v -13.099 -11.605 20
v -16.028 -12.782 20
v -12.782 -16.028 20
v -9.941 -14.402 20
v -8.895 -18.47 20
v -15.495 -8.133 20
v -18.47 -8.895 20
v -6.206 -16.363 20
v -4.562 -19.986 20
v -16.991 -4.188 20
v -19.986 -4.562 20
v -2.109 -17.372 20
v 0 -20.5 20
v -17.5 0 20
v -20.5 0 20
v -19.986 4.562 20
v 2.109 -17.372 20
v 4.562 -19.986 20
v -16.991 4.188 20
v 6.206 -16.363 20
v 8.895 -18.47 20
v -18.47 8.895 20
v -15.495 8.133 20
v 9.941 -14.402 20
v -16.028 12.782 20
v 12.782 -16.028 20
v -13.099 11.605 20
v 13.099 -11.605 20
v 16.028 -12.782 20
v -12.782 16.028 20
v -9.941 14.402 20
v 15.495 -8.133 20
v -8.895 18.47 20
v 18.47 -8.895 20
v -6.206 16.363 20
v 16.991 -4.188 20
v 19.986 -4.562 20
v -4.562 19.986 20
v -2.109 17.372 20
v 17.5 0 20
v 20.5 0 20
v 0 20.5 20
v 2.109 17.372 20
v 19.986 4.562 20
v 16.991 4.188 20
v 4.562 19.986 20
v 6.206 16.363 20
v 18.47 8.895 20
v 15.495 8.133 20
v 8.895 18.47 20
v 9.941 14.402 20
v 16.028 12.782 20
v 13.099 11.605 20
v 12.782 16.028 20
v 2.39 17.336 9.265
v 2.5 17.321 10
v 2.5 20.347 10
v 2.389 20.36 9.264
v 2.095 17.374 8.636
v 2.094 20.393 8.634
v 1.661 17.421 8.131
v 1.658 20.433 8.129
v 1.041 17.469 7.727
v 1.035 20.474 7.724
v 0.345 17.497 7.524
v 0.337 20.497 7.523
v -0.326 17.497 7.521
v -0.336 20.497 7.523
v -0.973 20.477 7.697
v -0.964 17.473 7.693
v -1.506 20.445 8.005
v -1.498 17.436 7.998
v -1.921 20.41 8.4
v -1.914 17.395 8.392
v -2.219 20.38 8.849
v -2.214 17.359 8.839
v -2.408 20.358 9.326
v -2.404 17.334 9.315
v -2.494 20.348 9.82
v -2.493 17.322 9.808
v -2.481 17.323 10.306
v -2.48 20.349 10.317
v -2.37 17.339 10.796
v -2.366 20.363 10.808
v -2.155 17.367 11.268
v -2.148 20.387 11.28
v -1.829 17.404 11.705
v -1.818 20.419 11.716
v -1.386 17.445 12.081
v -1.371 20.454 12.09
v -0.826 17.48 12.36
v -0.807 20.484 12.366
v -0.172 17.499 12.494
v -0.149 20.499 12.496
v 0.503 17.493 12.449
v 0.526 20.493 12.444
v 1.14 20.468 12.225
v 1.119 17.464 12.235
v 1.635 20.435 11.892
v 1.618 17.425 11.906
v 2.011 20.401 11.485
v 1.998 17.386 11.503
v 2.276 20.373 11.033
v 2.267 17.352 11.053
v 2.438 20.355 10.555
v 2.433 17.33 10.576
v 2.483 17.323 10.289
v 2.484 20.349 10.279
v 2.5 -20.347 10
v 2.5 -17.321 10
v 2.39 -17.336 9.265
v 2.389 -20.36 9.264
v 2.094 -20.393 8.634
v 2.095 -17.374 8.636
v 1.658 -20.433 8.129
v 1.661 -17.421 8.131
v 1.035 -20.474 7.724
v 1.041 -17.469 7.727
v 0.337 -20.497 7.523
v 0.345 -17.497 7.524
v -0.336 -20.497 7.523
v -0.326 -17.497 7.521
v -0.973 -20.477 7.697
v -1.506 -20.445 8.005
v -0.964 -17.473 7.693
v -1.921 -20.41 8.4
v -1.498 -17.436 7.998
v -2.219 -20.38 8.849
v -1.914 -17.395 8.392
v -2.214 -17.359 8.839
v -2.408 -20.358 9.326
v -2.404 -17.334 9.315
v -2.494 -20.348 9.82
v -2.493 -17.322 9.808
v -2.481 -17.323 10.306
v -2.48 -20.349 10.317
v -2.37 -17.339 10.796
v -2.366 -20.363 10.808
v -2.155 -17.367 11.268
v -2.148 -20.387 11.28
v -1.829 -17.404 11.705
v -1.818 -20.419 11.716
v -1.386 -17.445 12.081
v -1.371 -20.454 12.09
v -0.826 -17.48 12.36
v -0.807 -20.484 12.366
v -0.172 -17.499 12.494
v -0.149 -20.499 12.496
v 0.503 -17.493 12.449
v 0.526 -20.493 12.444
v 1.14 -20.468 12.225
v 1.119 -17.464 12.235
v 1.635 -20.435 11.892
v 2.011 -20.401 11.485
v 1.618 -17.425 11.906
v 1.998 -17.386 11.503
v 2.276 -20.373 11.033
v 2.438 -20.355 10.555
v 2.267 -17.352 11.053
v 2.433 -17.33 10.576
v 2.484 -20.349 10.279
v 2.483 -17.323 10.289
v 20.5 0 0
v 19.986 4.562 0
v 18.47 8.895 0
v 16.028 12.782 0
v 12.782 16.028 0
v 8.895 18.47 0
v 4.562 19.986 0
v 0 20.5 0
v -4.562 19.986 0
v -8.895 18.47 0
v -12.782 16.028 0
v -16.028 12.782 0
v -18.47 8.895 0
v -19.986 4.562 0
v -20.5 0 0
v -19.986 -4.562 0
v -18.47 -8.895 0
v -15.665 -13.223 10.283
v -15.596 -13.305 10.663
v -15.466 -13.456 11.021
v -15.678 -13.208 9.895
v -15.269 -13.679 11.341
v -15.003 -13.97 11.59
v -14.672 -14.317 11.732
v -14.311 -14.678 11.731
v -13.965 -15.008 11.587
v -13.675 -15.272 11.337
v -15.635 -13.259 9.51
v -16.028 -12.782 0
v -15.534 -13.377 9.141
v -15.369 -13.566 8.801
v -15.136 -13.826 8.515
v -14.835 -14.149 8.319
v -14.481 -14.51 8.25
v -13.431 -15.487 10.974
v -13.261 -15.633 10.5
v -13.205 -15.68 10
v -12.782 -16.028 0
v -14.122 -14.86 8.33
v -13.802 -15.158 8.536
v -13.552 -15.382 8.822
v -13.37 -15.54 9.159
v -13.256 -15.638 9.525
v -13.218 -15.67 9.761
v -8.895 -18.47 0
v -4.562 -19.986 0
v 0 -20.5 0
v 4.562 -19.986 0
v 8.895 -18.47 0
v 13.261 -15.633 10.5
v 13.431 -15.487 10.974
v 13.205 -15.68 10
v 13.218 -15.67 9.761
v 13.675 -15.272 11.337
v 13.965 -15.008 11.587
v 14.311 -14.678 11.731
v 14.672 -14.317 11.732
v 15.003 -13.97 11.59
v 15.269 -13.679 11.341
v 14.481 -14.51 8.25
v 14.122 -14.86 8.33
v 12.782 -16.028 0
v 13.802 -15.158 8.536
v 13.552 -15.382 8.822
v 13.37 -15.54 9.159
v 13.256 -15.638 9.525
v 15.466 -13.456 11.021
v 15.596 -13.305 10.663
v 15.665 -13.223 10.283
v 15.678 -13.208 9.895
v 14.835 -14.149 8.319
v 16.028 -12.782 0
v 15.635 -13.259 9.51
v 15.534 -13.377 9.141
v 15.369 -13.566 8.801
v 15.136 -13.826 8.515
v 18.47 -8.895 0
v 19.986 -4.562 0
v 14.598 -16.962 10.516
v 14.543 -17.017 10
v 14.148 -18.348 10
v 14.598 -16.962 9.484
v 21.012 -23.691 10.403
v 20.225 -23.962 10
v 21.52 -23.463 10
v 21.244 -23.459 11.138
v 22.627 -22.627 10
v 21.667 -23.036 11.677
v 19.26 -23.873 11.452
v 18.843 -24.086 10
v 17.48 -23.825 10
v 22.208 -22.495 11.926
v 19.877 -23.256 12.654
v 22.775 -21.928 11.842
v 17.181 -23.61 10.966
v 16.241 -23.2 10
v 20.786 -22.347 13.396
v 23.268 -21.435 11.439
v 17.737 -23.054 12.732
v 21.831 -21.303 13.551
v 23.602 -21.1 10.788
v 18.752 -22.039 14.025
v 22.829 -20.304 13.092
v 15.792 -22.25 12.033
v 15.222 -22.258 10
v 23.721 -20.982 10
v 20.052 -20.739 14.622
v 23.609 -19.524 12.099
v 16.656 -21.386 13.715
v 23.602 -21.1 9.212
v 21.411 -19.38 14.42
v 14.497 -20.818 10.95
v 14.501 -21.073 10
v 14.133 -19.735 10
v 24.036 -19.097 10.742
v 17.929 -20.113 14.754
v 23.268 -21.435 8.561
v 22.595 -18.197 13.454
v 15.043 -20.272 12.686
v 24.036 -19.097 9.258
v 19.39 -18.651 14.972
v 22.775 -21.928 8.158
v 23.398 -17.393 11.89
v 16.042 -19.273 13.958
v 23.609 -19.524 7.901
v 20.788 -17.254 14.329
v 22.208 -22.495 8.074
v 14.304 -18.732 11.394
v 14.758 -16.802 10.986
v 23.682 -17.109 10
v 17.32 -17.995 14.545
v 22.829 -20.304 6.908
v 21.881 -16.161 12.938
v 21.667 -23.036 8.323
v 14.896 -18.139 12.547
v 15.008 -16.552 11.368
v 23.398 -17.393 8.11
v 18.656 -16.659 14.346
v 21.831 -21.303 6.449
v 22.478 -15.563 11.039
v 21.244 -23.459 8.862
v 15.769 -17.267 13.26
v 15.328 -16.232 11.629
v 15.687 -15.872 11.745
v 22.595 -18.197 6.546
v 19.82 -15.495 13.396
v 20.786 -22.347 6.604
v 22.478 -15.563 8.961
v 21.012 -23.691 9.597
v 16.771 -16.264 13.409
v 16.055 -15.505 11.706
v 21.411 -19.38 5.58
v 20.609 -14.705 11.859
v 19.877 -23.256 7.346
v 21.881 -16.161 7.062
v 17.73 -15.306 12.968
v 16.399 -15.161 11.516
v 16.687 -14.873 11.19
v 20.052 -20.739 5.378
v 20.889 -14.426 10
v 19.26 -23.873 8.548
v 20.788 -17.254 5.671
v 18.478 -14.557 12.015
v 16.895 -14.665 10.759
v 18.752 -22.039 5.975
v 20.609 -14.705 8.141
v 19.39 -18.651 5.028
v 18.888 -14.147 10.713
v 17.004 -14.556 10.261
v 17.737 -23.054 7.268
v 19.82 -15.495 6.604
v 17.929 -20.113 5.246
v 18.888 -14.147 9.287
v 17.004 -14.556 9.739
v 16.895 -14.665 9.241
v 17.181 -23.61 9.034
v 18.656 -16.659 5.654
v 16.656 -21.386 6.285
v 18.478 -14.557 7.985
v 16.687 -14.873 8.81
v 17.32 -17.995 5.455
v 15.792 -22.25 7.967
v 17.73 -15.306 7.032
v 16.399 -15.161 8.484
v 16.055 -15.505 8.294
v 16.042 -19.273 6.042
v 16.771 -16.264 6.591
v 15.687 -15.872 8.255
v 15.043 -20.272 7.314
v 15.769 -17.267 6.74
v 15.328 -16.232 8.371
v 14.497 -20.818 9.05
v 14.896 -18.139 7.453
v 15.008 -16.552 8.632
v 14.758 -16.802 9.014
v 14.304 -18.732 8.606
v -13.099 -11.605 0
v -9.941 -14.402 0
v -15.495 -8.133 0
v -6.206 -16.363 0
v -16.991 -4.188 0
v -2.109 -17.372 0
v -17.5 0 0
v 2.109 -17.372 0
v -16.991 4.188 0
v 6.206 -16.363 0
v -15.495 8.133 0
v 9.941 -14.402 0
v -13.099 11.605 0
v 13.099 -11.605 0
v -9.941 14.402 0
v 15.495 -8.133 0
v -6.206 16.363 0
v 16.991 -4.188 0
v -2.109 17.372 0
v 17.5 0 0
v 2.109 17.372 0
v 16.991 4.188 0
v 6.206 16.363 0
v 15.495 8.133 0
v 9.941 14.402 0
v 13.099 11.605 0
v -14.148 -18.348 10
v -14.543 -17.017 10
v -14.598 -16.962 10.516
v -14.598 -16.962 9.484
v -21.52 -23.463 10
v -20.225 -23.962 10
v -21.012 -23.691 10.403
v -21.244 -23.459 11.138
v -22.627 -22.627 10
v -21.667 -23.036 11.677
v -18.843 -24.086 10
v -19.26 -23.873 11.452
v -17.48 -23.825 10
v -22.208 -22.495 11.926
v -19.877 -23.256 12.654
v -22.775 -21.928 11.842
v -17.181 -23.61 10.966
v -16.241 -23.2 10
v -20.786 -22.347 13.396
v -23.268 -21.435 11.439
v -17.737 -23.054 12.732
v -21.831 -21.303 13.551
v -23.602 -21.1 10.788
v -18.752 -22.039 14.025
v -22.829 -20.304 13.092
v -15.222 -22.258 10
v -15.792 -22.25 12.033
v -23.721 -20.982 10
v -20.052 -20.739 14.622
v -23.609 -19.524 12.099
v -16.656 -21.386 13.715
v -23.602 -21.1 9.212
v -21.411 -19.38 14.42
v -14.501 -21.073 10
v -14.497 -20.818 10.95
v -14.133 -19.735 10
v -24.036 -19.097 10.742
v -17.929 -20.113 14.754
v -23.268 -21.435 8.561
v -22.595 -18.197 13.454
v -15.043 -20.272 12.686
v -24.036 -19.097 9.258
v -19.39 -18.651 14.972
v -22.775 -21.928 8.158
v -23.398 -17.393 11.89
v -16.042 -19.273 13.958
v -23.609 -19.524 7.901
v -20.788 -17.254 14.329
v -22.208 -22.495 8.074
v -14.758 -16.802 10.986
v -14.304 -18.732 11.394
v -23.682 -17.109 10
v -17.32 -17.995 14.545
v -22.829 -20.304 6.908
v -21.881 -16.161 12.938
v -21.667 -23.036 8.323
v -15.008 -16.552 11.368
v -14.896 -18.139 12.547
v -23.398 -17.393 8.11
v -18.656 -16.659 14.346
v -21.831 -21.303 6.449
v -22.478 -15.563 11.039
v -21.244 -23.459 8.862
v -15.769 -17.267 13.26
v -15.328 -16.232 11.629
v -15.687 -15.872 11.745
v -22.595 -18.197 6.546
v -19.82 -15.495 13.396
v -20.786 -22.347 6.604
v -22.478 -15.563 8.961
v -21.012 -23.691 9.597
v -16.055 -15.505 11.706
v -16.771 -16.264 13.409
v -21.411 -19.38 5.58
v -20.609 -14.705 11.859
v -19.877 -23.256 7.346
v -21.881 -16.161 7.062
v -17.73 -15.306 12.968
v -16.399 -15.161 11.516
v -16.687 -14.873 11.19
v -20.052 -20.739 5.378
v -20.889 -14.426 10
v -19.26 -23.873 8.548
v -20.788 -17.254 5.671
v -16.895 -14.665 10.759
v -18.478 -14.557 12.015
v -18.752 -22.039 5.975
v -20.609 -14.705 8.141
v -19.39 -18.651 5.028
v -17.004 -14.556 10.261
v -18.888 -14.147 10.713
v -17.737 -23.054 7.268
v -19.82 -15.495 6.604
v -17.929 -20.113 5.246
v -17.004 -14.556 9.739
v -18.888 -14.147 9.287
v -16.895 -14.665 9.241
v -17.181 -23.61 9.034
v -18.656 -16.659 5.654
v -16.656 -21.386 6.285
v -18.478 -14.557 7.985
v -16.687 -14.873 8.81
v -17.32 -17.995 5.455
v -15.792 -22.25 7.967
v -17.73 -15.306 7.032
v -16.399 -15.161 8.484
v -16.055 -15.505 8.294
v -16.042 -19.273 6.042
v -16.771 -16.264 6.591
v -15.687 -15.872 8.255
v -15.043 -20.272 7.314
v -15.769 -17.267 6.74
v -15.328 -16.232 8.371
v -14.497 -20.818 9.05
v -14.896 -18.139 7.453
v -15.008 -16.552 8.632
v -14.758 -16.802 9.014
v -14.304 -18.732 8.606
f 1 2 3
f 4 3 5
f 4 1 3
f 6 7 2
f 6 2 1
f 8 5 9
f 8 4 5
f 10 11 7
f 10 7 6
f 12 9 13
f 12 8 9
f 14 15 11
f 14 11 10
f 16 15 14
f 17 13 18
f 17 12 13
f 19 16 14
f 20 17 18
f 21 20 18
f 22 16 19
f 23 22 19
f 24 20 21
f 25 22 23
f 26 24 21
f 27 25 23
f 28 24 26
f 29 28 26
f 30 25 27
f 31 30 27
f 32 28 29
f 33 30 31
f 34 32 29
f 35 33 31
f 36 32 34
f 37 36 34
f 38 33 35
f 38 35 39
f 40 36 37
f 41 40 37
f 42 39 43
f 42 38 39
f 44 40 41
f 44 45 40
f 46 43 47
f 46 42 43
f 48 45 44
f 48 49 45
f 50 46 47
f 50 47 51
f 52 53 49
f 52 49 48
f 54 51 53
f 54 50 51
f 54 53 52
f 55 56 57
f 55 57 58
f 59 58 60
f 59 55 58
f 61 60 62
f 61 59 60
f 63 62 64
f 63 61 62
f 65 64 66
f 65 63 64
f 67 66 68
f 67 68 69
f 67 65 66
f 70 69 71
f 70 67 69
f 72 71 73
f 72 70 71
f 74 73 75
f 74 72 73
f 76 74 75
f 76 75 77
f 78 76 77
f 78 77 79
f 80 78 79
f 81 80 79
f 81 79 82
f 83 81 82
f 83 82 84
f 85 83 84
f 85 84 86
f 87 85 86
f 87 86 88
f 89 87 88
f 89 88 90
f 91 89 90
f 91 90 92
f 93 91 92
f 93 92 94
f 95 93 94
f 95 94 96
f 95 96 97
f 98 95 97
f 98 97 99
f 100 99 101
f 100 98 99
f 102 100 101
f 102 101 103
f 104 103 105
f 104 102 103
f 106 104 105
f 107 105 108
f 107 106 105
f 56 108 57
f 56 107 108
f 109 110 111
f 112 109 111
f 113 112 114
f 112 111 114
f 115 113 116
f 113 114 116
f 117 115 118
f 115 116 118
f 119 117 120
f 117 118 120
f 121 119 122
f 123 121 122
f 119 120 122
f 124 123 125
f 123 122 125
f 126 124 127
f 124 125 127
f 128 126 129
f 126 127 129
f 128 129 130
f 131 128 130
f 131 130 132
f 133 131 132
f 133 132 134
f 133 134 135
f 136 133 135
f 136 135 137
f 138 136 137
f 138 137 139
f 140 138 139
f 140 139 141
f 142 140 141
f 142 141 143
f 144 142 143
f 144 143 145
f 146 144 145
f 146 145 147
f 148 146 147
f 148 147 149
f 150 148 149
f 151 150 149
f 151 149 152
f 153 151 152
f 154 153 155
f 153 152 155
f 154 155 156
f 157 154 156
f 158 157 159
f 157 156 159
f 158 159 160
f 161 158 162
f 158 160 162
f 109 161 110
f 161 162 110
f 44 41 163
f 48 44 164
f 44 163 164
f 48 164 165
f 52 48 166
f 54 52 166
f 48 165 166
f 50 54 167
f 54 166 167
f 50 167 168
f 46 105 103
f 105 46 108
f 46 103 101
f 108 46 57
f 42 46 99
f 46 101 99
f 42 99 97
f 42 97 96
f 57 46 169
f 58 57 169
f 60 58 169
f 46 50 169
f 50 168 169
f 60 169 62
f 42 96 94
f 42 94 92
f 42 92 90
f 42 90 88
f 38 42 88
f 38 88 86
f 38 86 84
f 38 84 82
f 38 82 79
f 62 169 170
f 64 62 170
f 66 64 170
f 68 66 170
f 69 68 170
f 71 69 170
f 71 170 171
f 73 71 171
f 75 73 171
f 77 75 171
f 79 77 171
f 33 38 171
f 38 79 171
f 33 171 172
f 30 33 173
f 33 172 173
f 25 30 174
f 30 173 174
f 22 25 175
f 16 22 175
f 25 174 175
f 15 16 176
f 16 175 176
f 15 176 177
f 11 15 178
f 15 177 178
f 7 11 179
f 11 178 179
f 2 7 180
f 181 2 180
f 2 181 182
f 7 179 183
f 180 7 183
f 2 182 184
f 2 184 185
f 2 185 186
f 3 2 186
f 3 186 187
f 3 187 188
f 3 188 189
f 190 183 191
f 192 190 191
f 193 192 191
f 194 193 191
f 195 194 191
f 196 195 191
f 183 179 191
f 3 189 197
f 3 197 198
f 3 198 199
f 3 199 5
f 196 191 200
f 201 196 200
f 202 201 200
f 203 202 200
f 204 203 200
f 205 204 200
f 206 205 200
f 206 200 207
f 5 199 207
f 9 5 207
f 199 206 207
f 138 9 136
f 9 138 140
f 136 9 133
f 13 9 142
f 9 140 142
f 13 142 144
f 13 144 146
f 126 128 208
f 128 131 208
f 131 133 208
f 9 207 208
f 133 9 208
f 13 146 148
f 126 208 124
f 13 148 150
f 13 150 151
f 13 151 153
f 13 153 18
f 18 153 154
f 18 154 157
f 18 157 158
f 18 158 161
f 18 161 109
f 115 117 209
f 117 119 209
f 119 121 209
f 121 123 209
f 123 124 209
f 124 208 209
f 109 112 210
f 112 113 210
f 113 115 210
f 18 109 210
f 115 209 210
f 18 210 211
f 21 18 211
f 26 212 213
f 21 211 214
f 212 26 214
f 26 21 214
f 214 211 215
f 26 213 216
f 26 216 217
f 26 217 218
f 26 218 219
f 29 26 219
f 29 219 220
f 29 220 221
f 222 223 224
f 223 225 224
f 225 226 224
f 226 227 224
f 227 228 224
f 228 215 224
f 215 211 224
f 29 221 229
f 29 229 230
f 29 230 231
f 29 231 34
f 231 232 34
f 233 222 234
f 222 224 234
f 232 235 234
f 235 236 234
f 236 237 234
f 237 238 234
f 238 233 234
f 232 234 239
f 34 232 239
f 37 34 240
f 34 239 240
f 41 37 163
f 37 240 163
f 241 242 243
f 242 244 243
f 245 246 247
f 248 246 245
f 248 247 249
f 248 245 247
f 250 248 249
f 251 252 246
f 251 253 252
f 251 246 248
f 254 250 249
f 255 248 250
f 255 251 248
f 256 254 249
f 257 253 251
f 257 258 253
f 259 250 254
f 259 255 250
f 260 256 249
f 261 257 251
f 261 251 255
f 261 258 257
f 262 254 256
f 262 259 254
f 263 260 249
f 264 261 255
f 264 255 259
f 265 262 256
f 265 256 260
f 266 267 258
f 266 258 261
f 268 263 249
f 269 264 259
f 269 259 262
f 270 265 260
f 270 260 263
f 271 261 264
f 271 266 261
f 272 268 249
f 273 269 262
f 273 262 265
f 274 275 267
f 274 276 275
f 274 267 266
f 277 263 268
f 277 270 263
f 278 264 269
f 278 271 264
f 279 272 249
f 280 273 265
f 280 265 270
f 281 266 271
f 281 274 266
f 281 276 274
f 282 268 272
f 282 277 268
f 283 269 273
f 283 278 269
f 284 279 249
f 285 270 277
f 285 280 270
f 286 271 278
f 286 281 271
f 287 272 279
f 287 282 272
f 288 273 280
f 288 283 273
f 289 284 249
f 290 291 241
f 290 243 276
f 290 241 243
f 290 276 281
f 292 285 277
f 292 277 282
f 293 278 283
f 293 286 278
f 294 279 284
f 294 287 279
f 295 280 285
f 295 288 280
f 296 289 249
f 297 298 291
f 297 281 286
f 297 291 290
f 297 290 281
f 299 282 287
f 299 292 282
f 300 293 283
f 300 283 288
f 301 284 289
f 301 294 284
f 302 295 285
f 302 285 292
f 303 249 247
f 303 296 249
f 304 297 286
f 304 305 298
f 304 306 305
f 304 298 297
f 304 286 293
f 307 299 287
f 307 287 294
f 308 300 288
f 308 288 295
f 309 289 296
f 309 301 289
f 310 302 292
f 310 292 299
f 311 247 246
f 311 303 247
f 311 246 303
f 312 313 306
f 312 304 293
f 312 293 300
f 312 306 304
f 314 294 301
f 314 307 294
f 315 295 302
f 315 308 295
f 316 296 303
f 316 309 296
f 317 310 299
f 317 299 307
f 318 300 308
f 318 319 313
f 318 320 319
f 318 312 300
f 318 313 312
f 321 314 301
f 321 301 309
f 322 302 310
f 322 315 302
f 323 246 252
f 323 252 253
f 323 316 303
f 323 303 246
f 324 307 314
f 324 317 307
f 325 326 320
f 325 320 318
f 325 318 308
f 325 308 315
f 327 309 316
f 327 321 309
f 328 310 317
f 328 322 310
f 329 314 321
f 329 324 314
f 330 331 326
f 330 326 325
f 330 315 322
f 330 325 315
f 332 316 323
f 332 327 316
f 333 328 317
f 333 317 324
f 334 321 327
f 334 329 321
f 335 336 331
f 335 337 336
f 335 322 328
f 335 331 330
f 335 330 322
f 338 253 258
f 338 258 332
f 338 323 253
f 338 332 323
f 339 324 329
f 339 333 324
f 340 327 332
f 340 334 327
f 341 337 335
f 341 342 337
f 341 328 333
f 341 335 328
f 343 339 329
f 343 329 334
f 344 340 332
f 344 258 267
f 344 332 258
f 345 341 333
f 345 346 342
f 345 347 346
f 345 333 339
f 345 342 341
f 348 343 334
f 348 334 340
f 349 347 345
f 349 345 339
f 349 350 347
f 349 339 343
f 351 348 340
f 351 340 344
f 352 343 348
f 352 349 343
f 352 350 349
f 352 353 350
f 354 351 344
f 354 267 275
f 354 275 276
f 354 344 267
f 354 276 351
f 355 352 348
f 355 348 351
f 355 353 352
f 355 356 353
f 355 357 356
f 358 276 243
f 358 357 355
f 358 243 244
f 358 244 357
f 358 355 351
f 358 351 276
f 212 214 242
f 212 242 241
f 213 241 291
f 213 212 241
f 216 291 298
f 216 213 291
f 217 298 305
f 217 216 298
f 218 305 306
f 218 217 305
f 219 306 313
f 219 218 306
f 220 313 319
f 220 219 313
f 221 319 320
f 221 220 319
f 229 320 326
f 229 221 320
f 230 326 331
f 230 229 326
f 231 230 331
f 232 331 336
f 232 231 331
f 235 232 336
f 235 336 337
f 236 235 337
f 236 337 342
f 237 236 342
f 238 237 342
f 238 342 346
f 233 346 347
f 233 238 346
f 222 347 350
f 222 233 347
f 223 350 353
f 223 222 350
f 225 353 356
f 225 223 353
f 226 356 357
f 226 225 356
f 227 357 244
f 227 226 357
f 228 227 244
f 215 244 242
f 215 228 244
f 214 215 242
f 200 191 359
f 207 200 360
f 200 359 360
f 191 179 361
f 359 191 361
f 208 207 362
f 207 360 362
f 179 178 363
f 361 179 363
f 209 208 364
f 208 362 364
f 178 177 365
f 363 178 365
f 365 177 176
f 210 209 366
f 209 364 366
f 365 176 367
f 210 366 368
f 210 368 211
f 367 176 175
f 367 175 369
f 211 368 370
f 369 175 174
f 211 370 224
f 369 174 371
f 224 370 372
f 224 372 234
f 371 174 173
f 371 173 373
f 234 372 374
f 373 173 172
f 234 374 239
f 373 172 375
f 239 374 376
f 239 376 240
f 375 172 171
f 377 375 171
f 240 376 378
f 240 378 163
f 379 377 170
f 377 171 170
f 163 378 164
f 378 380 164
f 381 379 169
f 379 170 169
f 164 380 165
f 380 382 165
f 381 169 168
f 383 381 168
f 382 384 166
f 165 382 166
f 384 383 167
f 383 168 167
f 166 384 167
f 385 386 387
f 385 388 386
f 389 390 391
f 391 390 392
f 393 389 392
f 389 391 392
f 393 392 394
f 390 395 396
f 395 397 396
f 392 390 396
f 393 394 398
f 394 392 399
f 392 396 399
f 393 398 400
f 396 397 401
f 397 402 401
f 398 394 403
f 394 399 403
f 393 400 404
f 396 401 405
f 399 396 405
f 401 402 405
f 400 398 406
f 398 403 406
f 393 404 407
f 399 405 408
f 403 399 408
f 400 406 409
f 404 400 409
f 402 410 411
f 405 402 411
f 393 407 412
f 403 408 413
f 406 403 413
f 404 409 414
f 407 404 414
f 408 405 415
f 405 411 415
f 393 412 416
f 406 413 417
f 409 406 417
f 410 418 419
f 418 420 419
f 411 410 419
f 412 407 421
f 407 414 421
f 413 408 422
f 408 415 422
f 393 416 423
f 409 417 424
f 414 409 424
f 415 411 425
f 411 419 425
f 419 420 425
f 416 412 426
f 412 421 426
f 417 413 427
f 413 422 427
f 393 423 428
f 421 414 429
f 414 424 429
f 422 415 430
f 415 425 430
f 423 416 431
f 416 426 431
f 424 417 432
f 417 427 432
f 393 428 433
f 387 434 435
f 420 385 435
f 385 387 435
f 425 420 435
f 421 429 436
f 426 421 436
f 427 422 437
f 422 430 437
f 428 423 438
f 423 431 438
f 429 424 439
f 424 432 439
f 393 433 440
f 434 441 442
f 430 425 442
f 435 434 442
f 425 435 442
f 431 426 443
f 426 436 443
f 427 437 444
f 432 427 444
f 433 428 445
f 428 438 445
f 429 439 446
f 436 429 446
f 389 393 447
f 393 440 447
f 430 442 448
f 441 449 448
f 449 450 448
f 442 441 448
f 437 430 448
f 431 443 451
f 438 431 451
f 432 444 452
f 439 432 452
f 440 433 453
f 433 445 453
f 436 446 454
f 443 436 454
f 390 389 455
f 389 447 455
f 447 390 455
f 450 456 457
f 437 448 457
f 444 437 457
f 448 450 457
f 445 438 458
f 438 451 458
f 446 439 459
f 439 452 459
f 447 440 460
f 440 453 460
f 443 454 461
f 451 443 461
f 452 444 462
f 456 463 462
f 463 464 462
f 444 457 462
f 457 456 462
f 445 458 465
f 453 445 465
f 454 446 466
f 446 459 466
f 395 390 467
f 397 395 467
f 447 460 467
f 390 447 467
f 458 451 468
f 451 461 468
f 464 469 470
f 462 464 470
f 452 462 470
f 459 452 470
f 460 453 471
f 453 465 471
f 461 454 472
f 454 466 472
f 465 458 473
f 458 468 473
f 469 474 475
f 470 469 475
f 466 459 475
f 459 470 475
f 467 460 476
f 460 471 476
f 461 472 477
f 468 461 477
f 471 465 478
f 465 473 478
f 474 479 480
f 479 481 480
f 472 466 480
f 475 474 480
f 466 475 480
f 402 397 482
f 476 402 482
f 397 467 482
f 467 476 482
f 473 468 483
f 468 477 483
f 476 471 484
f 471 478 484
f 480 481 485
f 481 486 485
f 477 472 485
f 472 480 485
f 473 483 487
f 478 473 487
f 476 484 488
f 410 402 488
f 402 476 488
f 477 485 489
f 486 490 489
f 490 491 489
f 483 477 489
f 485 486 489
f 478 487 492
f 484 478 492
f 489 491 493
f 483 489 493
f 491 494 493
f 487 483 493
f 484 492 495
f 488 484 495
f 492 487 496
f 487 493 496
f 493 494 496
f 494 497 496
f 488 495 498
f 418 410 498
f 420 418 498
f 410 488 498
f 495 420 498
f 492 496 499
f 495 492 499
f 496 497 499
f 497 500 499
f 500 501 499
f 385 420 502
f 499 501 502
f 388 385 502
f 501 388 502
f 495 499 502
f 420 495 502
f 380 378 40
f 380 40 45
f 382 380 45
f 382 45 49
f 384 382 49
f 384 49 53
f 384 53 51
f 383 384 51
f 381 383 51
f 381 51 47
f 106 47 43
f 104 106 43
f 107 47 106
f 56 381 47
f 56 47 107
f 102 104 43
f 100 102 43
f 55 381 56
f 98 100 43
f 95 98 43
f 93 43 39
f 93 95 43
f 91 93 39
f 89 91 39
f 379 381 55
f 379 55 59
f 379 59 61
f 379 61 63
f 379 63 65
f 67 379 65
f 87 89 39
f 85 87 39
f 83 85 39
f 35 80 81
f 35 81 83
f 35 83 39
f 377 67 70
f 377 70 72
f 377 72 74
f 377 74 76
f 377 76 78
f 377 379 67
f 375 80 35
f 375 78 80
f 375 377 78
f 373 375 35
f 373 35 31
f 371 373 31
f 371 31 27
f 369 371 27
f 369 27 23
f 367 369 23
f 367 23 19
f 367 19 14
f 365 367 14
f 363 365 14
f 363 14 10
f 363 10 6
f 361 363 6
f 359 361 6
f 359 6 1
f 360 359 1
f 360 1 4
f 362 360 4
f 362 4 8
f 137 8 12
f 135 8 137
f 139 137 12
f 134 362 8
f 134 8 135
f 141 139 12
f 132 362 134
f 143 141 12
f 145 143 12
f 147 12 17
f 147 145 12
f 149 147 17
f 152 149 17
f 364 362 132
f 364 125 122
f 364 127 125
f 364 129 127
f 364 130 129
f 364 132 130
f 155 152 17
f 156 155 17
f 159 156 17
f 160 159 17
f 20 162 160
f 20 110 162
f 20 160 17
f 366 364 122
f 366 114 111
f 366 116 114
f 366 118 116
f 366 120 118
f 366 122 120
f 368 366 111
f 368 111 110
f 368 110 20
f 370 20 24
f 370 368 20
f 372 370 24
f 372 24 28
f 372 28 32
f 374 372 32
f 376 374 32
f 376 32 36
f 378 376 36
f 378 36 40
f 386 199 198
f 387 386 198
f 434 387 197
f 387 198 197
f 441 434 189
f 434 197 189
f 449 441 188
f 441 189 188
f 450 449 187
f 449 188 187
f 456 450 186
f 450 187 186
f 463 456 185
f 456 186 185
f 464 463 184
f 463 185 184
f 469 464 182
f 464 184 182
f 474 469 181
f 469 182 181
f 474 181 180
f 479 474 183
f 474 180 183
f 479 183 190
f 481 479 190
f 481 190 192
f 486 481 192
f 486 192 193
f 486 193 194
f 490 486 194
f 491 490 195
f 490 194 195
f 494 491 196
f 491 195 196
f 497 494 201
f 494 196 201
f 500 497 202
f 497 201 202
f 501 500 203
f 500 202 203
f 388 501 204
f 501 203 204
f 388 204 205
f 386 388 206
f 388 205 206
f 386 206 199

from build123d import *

# Parameters (mm, degrees)
SKETCH1_R               = 20.5
SKETCH1_R_2             = 17.5
BOSS_EXTRUDE1_DEPTH     = 20
SKETCH2_R               = 2.5
CUT_EXTRUDE1_DEPTH      = 21.5
CUT_EXTRUDE1_DEPTH_BACK = 21.5


with BuildPart() as part:
    # Sketch1 → Boss-Extrude1 (new body)
    with BuildSketch(Plane.XY):
        Circle(SKETCH1_R)
        Circle(SKETCH1_R_2, mode=Mode.SUBTRACT)
    extrude(amount=BOSS_EXTRUDE1_DEPTH)

    # Sketch2 → Cut-Extrude1 (cut, two sides)
    with BuildSketch(Plane(origin=(0, 0, 0), x_dir=(1, 0, 0), z_dir=(0, 1, 0))) as cut_extrude1_sk:
        with Locations((0, -10)):
            Circle(SKETCH2_R)
    extrude(amount=CUT_EXTRUDE1_DEPTH, mode=Mode.SUBTRACT)
    extrude(cut_extrude1_sk.sketch, amount=-CUT_EXTRUDE1_DEPTH_BACK, mode=Mode.SUBTRACT)

    # Sketch4 → Revolve1 (revolve)
    with BuildSketch(Plane(origin=(0, 0, 10), x_dir=(-1, 0, 0), z_dir=(0, 0, -1))):
        with BuildLine():
            Line((14.142135624, -14.142135624), (22.627416998, -22.627416998))
            ThreePointArc((22.627416998, -22.627416998), (16.241444529, -23.199802273), (14.5425359, -17.017409634))
            Line((14.5425359, -17.017409634), (12.904698757, -15.379572491))
            Line((12.904698757, -15.379572491), (14.142135624, -14.142135624))
        make_face()
    revolve1 = revolve(axis=Axis((-14.142135624, -14.142135624, 10), (-0.707106781, -0.707106781, 0)))

    # Mirror1: Revolve1 across plane
    add(revolve1.mirror(Plane(origin=(0, 0, 0), x_dir=(0, 0, 1), z_dir=(1, 0, 0))))


solid = part.part
